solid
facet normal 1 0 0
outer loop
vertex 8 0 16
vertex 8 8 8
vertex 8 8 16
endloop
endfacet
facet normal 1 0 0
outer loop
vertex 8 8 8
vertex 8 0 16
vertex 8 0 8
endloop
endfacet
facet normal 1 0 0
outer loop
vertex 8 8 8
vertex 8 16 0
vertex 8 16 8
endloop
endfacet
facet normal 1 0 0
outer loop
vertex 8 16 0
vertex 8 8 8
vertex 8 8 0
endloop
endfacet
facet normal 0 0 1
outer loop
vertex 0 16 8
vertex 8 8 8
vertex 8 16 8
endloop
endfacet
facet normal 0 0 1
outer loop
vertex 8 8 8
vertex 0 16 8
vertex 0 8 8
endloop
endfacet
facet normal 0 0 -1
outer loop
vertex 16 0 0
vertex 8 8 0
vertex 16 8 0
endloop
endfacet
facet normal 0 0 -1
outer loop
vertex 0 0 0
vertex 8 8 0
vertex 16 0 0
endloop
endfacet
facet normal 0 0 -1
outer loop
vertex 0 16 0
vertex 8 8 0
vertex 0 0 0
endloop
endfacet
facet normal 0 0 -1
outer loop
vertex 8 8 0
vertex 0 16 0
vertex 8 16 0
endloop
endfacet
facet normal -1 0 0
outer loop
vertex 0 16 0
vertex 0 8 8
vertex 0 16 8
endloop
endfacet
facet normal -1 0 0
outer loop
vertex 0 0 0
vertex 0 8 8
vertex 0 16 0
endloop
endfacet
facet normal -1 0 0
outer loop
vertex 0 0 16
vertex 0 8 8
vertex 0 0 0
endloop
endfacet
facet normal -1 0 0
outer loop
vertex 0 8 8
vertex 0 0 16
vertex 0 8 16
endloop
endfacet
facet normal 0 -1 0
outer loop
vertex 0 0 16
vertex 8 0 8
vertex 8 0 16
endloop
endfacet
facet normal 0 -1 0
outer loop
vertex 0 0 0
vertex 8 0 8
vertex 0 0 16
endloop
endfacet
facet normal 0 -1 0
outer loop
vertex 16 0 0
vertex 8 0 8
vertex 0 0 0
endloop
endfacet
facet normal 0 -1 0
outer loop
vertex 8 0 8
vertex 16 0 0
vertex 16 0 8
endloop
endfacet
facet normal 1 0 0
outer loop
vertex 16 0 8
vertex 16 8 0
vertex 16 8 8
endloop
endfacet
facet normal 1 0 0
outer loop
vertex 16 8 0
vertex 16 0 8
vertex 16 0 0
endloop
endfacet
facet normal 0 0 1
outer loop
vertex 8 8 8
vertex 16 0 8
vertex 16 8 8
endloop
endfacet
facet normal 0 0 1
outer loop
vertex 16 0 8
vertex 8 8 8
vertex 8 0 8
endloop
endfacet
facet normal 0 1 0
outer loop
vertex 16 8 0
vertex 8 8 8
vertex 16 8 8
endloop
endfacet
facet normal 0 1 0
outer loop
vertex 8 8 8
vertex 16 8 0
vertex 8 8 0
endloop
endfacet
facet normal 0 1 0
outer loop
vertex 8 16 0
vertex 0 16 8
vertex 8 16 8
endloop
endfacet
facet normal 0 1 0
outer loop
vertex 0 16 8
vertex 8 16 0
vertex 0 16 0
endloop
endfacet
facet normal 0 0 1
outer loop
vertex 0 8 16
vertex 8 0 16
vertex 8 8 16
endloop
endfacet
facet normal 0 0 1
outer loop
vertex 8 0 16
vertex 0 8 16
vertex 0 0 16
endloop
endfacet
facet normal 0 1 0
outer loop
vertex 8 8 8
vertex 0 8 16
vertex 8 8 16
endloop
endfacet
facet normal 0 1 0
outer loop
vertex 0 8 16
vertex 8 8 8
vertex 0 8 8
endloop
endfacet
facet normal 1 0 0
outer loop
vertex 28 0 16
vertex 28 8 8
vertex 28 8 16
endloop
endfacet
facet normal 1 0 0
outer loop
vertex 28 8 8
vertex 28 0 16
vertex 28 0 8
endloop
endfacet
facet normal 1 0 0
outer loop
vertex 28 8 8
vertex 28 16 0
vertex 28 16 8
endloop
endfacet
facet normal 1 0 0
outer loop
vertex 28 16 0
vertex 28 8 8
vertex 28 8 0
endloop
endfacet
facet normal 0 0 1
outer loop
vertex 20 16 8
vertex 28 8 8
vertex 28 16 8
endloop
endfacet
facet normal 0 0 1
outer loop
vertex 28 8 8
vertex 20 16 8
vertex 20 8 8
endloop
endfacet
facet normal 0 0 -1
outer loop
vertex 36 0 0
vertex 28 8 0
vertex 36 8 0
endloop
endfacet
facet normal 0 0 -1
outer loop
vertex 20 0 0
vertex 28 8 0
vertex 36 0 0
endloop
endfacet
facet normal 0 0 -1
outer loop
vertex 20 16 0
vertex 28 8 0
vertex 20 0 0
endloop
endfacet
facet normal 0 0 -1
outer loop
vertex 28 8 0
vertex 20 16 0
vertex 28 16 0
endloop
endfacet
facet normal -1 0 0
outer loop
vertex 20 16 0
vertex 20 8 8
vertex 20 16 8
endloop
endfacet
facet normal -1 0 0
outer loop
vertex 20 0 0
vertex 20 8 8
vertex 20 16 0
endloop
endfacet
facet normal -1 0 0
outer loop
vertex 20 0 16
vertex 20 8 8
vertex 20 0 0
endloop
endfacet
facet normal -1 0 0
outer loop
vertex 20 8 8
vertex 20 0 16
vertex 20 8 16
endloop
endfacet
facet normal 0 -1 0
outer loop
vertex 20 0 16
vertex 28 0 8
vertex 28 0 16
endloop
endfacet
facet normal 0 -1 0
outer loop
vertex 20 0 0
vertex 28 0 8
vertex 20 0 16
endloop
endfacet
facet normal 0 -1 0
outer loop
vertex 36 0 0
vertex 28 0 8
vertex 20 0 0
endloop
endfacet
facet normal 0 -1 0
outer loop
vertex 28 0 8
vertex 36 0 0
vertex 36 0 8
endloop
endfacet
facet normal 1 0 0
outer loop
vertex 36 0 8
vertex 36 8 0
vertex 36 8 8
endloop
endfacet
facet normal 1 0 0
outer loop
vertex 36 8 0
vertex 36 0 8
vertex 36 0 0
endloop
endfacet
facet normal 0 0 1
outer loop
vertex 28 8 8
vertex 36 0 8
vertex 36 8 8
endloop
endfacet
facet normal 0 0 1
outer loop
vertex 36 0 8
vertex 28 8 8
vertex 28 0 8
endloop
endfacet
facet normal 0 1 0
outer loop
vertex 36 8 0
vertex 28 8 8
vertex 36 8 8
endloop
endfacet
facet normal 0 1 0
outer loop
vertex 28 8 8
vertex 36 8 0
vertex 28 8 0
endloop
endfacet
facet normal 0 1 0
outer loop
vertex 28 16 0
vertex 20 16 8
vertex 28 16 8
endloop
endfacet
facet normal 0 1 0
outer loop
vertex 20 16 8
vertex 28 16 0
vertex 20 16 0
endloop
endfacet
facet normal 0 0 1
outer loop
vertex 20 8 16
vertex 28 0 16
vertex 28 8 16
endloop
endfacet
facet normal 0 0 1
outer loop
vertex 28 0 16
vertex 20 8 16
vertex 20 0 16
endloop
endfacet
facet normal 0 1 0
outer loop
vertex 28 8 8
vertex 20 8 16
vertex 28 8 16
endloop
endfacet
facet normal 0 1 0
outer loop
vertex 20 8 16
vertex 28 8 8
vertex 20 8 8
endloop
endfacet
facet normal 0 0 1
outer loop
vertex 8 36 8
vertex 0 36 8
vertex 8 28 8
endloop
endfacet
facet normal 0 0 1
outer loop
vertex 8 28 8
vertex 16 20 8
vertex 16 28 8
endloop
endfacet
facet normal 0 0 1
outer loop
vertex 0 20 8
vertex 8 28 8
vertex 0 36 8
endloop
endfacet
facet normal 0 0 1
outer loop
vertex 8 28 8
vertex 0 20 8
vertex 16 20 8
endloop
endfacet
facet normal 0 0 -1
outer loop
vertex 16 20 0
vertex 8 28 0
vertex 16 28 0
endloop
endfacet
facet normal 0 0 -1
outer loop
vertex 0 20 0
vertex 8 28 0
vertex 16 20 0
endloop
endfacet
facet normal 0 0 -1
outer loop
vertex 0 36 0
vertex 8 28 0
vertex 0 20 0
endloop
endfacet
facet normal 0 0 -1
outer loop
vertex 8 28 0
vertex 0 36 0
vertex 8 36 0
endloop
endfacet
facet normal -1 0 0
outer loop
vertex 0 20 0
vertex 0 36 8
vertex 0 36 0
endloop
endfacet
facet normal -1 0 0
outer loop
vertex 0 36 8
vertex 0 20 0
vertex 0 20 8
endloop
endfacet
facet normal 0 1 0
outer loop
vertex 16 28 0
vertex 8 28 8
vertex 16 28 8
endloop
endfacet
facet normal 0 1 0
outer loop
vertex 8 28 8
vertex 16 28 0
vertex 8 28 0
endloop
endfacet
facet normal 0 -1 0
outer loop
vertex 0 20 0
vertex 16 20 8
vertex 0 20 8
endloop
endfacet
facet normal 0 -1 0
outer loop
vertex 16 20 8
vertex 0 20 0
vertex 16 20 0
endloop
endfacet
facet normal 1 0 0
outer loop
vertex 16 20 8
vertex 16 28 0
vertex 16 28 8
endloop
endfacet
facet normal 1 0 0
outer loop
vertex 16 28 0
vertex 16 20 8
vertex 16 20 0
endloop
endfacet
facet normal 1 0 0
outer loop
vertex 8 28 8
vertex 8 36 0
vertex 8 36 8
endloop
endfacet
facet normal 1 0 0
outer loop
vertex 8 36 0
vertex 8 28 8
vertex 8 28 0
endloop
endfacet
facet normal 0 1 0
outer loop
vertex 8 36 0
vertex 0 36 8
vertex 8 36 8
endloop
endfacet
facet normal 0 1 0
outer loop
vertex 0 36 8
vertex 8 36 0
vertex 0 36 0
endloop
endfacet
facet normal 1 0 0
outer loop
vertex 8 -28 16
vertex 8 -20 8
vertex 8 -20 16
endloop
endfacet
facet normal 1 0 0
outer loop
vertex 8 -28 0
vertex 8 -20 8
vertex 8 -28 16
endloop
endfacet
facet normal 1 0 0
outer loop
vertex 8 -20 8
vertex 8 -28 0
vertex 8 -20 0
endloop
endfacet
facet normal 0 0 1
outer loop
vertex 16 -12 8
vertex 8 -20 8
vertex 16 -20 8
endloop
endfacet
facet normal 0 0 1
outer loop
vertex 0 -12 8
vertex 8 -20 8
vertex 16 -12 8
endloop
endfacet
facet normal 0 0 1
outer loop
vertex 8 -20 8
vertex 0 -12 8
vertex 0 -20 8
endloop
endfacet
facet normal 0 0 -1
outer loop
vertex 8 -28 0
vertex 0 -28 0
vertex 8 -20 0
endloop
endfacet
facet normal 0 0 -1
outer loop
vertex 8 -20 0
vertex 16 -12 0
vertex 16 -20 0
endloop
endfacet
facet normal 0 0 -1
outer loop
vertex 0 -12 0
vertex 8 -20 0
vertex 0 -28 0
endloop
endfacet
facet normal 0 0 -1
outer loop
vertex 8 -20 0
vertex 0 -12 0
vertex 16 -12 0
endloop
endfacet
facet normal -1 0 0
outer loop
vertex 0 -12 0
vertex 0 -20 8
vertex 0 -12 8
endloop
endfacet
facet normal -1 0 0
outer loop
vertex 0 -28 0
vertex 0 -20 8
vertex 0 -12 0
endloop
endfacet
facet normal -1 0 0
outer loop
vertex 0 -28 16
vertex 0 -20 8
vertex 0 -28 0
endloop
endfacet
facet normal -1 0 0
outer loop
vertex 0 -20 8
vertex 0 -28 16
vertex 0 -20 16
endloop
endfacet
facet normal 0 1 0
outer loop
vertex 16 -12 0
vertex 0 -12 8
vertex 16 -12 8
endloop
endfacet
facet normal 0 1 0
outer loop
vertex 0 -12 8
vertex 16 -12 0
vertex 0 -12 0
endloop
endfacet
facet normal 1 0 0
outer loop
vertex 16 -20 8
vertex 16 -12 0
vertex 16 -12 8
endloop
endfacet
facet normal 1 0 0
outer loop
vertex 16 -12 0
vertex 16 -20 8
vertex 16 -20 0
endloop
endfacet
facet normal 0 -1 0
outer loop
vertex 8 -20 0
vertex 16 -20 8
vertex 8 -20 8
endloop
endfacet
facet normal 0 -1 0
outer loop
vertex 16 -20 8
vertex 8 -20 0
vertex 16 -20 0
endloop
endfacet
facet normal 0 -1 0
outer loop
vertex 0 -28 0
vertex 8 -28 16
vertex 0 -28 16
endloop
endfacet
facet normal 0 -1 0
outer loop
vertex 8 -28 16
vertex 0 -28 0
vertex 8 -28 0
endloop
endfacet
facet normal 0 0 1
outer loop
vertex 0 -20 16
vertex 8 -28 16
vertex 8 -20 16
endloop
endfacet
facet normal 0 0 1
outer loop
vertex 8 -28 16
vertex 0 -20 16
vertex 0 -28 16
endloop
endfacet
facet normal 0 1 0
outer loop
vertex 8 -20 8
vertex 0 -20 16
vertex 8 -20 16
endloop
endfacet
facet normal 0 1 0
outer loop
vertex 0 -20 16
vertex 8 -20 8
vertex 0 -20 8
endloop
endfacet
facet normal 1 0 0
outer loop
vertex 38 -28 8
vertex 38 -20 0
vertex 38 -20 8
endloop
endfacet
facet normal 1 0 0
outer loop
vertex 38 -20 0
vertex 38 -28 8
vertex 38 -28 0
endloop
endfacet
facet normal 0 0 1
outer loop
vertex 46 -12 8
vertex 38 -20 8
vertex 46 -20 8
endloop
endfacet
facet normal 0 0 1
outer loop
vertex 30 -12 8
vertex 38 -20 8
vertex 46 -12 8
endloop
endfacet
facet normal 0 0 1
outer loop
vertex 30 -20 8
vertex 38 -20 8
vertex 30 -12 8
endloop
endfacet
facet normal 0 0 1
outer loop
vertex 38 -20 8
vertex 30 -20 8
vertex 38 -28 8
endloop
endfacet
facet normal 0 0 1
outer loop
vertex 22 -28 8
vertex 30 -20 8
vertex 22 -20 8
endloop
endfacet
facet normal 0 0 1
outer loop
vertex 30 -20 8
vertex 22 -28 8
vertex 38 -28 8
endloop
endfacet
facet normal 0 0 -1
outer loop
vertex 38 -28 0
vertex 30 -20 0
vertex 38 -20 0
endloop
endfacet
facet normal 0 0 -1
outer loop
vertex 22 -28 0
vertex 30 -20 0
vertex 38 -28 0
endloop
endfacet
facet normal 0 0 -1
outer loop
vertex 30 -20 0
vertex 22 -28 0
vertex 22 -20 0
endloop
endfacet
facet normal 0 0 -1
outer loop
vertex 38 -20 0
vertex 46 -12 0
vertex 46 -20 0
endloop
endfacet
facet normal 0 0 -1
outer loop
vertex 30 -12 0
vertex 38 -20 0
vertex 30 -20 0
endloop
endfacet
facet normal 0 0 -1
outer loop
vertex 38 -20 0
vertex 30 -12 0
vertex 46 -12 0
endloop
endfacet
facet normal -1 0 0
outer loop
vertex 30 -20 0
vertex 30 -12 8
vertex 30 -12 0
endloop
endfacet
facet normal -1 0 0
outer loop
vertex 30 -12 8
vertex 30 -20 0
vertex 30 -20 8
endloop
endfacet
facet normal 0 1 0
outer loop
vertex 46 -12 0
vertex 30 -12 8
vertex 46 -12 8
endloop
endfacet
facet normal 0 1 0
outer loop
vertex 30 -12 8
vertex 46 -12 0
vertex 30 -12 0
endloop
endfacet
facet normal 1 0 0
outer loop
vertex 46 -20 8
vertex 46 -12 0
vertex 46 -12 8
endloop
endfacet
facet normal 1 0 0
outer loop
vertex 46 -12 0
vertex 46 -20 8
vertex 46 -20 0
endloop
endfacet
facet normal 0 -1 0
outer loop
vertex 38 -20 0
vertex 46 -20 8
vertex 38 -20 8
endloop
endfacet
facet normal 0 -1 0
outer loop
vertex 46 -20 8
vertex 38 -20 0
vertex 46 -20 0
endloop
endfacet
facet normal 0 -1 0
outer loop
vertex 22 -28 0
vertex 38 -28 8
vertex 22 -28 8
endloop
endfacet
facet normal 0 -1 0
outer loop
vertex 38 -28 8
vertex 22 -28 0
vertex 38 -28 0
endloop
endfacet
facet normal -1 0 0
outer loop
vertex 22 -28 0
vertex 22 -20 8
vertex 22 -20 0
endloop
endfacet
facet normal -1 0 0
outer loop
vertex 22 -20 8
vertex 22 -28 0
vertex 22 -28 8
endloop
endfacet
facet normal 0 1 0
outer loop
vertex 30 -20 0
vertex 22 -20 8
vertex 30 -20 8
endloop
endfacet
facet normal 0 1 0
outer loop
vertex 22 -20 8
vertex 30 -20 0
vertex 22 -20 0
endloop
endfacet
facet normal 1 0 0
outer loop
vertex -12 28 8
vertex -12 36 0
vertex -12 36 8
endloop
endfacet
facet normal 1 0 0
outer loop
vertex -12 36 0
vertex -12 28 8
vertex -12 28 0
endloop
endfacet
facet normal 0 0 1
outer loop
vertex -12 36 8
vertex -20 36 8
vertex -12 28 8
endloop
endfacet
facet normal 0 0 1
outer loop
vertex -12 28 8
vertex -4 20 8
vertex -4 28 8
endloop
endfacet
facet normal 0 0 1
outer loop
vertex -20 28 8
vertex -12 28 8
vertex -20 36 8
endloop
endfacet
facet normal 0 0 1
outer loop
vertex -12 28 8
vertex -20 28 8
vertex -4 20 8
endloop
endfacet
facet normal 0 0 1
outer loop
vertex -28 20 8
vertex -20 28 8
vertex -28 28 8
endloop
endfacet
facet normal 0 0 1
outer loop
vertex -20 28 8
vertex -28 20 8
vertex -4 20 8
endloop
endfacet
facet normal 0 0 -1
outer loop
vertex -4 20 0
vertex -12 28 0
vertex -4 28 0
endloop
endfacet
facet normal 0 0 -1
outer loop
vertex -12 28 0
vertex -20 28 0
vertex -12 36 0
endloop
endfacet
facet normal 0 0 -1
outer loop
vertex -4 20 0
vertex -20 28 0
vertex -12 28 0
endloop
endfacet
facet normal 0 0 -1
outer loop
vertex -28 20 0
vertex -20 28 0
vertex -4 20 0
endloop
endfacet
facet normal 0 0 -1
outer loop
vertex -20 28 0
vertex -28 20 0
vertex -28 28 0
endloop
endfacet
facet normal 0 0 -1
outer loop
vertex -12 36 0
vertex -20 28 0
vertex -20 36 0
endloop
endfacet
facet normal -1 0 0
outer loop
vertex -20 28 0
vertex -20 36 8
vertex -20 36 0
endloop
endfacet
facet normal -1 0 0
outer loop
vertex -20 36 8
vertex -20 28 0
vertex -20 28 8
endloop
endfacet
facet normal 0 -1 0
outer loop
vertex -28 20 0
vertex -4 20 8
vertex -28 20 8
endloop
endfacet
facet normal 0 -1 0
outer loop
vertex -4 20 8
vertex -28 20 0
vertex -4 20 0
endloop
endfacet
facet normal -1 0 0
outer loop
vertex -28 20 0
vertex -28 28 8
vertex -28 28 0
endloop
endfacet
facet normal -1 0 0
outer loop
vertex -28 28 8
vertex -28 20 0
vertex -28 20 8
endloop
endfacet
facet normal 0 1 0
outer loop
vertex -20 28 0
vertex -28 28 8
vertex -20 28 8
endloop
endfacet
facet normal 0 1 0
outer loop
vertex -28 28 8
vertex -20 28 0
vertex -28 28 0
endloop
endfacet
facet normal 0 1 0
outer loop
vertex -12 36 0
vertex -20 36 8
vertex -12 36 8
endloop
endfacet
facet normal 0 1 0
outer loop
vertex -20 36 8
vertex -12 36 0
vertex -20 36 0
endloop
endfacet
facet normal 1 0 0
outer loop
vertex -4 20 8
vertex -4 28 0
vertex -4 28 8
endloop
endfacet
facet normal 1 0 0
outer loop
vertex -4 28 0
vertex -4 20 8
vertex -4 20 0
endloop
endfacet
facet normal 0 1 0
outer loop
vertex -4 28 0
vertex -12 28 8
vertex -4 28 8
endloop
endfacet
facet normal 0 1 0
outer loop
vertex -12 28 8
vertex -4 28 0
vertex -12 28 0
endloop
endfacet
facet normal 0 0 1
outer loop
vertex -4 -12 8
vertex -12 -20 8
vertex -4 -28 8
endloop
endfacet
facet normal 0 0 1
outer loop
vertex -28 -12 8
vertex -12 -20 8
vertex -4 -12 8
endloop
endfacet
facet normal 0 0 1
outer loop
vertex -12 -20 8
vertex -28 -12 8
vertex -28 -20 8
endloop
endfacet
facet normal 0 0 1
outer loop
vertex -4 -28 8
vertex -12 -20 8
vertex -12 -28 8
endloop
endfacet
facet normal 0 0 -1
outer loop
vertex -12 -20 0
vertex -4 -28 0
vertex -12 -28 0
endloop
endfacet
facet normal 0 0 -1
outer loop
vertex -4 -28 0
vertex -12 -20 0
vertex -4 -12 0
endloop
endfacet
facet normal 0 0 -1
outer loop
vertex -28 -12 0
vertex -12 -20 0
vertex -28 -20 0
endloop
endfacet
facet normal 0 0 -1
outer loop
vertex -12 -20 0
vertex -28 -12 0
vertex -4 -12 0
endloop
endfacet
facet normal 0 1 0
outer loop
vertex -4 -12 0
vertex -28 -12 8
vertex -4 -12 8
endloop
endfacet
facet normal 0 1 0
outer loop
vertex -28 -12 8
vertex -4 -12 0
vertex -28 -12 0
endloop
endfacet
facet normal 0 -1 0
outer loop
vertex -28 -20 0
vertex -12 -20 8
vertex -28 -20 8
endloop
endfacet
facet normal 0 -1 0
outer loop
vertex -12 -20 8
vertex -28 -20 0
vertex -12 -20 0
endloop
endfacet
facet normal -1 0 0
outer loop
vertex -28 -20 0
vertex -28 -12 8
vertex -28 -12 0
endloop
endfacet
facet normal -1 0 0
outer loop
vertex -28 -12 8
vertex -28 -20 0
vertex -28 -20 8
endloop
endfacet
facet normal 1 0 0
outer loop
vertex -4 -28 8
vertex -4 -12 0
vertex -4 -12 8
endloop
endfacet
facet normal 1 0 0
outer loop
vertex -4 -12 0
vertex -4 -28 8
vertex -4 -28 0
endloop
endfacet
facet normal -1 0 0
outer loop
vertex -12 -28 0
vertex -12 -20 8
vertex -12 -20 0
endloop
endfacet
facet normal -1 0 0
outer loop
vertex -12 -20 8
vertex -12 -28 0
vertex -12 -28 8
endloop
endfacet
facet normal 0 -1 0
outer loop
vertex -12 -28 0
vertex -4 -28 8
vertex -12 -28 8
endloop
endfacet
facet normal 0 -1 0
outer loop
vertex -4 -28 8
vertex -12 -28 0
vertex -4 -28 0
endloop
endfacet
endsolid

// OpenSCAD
module wurf(){
cube([8, 8, 8]);
}

module kul(){
    union(){
    wurf();
    translate([8, 0, 0])
        wurf();
    translate([0, 8, 0])
        wurf();
    translate([0, 0, 8])
        wurf();
    }
}

kul();
translate([20, 0, 0])
    kul();

union(){
    translate([0, 20, 0])
        wurf();
    translate([8, 20, 0])
        wurf();
    translate([0, 28, 0])
        wurf();
}

union(){
    translate([0, -20, 0])
        wurf();
    translate([8, -20, 0])
        wurf();
    translate([0, -28, 0])
        wurf();
    translate([0, -28, 8])
        wurf();
}

union(){
    translate([30, -20, 0])
        wurf();
    translate([38, -20, 0])
        wurf();
    translate([30, -28, 0])
        wurf();
    translate([22, -28, 0])
        wurf();
}


union(){
    translate([-20, 20, 0])
        wurf();
    translate([-28, 20, 0])
        wurf();
    translate([-20, 28, 0])
        wurf();
    translate([-12, 20, 0])
        wurf();
}

union(){
    translate([-20, -20, 0])
        wurf();
    translate([-28, -20, 0])
        wurf();
    translate([-12, -28, 0])
        wurf();
    translate([-12, -20, 0])
        wurf();
}
